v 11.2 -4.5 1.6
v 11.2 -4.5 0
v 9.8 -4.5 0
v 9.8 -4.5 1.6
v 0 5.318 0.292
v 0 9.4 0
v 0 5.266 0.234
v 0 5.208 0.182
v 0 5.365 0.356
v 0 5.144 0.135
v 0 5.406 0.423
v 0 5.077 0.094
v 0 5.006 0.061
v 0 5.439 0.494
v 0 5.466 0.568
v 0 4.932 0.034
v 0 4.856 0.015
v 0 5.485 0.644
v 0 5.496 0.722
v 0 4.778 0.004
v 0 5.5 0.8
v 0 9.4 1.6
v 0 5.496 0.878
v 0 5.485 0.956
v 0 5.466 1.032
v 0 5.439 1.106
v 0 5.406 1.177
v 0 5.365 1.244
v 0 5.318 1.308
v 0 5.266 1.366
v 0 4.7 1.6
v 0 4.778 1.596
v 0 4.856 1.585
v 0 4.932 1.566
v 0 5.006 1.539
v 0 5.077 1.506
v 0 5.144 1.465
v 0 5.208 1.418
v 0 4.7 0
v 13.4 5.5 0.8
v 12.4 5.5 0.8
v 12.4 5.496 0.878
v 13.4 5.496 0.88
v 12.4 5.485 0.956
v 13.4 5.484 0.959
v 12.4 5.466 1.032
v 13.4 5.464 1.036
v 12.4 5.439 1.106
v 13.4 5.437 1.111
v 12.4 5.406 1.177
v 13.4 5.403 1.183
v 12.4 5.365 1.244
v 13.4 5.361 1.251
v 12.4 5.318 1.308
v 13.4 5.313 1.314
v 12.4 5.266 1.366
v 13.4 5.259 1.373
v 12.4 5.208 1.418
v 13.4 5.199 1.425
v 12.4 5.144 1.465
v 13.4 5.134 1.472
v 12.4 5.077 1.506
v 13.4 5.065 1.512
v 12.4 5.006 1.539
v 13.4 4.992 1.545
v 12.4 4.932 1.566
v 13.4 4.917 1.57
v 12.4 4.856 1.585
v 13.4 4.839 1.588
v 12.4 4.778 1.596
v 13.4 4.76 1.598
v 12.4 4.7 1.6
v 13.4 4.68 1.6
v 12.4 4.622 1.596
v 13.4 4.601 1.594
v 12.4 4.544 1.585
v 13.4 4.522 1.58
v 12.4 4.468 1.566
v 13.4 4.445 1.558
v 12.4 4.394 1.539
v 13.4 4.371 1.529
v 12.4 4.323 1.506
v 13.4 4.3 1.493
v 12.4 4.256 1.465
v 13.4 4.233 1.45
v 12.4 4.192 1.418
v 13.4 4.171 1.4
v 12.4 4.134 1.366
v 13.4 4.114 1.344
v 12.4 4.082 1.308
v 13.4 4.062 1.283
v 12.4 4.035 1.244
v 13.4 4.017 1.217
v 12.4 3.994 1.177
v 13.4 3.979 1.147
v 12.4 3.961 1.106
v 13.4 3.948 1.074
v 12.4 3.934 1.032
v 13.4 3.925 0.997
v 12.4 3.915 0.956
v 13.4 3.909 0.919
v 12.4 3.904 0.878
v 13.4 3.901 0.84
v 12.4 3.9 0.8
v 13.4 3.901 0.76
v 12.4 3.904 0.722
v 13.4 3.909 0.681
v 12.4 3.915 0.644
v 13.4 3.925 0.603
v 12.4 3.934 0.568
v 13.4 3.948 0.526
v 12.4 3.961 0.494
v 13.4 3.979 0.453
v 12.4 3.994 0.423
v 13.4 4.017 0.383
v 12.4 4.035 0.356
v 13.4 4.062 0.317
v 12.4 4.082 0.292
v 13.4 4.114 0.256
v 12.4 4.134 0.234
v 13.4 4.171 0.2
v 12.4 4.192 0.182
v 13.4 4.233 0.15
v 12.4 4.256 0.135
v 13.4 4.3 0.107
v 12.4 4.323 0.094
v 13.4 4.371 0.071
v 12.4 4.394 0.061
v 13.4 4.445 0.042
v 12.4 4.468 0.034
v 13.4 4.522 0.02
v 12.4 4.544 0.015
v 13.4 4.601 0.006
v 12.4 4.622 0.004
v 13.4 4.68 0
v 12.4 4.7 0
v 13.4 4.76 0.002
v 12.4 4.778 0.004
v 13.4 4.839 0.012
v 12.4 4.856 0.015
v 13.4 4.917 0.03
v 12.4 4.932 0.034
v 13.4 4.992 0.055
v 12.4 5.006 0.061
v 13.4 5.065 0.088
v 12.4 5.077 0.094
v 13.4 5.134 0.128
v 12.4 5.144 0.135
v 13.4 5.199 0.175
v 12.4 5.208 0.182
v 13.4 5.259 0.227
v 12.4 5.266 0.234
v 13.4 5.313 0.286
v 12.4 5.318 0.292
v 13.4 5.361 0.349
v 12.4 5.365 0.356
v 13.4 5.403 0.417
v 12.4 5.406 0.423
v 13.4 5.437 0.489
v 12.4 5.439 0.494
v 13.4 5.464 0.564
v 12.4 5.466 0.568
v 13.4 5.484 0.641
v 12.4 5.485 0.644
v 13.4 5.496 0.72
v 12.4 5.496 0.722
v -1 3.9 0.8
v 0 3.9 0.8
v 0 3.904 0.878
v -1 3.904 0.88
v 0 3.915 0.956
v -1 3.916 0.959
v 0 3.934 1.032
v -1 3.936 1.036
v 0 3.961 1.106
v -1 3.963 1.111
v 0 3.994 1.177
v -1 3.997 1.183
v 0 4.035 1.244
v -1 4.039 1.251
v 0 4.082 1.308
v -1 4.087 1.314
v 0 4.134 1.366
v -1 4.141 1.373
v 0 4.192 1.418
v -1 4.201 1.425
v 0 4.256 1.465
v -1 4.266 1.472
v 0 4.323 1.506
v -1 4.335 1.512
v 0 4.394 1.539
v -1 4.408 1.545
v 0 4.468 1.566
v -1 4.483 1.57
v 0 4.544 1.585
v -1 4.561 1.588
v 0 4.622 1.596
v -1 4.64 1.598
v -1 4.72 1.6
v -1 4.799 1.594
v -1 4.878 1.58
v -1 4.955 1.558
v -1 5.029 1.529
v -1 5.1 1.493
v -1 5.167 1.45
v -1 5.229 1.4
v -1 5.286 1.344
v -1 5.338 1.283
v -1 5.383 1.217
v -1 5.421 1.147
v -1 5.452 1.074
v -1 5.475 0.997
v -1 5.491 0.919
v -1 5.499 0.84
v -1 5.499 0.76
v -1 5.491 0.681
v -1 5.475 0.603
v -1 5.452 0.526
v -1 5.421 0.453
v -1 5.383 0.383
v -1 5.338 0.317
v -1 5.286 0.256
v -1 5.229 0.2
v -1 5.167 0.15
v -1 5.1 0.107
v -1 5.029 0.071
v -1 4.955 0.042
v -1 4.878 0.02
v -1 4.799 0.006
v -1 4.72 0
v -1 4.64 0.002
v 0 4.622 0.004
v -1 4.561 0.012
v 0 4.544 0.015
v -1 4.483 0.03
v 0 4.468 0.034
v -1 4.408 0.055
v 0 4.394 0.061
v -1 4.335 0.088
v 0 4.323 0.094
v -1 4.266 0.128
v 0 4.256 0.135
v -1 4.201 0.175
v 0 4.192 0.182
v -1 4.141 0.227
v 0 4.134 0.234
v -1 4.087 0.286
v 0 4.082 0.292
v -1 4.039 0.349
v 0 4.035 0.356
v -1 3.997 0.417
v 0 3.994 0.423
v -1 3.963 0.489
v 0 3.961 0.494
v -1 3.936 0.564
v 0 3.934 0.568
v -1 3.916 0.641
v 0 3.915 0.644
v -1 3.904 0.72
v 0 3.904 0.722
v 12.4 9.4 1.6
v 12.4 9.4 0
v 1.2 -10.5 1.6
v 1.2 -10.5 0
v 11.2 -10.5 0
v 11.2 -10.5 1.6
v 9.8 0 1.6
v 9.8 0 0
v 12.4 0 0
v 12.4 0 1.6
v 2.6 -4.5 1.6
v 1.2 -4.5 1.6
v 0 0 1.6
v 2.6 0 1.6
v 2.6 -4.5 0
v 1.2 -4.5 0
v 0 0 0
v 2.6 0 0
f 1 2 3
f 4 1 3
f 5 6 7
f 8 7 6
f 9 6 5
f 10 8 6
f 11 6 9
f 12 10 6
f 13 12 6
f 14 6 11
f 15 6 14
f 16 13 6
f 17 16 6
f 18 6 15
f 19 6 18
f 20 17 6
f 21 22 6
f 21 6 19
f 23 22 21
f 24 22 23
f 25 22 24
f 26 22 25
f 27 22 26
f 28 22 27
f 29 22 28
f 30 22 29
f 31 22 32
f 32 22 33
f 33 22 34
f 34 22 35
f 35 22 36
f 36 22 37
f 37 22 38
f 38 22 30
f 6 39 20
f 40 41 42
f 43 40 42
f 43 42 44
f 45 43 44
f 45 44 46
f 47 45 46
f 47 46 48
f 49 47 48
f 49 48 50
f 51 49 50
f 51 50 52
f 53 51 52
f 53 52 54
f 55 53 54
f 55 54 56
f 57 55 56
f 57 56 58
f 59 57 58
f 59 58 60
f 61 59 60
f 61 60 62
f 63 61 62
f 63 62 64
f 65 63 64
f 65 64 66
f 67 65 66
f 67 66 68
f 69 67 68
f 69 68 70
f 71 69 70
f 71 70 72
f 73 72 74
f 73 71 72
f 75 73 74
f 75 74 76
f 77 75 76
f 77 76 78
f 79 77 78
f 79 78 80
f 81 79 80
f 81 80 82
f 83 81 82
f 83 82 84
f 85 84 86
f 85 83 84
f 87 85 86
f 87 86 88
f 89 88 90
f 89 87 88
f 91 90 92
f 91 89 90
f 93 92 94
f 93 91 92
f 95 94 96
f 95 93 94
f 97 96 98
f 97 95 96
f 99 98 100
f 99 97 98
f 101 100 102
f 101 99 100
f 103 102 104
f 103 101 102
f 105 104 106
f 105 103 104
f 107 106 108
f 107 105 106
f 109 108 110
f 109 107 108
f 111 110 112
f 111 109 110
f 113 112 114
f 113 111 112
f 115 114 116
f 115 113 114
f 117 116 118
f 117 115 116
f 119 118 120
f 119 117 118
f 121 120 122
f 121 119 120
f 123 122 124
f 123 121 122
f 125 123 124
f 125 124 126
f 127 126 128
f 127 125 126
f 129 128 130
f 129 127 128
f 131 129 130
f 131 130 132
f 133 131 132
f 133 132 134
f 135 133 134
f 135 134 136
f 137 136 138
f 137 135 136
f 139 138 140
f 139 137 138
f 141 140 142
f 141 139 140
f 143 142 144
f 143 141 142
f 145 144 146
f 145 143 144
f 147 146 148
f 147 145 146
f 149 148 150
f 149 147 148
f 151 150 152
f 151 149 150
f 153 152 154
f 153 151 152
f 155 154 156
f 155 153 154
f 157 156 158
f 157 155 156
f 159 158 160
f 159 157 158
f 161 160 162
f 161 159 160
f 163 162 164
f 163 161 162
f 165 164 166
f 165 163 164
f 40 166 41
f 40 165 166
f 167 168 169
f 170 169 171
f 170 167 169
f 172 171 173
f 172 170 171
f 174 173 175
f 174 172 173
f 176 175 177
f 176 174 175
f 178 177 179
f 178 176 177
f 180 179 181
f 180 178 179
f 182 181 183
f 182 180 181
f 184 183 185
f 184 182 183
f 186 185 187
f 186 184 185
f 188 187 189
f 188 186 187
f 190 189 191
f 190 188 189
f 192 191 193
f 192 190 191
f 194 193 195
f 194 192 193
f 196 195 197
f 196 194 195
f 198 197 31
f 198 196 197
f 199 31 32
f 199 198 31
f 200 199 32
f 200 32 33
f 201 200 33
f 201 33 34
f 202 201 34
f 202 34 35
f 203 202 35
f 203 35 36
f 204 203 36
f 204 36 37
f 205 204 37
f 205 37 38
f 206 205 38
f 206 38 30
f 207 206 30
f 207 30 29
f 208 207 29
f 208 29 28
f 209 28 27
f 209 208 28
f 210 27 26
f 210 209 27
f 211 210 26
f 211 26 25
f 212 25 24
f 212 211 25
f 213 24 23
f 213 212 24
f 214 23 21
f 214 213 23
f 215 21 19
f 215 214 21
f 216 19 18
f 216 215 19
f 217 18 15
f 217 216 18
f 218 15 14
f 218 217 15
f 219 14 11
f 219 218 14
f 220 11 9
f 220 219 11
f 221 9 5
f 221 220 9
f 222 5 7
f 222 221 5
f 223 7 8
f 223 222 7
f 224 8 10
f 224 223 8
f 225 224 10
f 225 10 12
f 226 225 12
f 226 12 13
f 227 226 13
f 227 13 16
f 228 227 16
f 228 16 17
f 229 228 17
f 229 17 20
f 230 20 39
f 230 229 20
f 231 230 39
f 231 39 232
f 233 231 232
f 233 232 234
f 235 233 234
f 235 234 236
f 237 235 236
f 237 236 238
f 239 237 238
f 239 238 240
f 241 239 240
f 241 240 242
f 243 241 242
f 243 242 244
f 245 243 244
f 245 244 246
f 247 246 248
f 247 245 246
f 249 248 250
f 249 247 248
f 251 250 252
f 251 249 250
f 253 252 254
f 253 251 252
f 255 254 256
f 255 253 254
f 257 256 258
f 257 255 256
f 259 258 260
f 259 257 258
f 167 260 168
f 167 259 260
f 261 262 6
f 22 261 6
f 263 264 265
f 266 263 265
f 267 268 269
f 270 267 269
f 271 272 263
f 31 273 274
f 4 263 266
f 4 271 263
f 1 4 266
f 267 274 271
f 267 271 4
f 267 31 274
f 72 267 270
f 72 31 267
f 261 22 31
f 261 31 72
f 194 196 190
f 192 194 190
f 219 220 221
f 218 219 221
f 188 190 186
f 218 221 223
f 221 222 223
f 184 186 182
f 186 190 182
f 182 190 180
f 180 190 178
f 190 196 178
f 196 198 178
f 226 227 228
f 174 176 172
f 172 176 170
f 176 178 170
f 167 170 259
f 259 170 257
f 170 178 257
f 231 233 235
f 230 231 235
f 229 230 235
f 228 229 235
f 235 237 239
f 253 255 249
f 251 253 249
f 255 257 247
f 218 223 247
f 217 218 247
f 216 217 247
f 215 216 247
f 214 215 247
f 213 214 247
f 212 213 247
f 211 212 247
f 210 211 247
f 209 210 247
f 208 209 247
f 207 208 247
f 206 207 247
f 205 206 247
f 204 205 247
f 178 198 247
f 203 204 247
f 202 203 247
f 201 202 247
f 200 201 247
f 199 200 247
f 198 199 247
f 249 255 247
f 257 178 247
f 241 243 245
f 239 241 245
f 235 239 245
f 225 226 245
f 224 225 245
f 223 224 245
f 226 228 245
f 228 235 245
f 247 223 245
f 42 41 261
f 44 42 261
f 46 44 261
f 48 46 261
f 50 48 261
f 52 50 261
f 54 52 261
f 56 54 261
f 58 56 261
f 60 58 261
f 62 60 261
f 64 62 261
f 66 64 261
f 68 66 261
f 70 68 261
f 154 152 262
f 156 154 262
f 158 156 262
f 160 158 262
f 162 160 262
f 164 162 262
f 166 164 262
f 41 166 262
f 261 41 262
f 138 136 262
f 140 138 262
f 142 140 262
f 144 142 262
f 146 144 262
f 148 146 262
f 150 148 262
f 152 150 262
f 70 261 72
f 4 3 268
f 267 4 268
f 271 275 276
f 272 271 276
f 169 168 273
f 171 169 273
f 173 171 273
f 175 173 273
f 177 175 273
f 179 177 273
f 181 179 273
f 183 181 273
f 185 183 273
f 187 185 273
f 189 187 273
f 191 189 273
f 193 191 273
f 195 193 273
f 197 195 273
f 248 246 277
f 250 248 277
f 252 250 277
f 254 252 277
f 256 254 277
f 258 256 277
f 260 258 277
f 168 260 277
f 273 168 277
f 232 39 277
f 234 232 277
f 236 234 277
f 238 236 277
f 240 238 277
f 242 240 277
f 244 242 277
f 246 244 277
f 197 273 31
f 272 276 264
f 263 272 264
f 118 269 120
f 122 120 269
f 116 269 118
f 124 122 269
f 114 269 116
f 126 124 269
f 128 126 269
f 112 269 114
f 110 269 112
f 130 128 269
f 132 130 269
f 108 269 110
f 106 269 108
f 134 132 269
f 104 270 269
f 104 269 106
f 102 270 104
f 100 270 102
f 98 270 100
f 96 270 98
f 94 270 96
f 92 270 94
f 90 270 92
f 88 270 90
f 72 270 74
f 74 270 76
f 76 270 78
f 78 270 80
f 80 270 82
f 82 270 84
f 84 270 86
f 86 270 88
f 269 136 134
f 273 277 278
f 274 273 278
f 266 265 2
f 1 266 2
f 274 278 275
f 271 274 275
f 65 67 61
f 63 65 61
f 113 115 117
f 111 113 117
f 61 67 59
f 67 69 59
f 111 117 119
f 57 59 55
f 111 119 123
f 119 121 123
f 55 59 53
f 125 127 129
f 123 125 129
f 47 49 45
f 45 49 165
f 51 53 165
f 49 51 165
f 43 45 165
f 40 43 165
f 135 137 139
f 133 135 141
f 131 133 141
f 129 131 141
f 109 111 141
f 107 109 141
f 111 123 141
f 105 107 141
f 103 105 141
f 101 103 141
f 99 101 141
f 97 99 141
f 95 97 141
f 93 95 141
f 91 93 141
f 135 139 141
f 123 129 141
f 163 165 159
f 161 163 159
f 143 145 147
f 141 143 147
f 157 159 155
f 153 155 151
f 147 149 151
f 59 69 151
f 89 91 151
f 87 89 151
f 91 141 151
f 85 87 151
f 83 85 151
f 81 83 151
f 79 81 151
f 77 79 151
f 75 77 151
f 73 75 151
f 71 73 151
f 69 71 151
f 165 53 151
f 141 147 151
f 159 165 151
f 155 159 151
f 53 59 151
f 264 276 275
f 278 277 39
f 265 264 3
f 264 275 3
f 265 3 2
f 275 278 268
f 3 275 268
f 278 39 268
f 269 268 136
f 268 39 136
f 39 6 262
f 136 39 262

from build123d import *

# Parameters (mm, degrees)
F1_DEPTH = 1.6
F2_W     = 3.14566
F2_H     = 3.226229
F2_R     = 0.8
F3_DEPTH = 1
F4_W     = 2.903376
F4_H     = 2.958158
F4_R     = 0.8
F5_DEPTH = 1


with BuildPart() as f1:
    # F0 (on Top) → F1 (new body)
    with BuildSketch(Plane.XY):
        Polygon((0, 3.9), (0, 0), (2.6, 0), (2.6, -4.5), (1.2, -4.5), (1.2, -10.5), (11.2, -10.5), (11.2, -4.5), (9.8, -4.5), (9.8, 0), (12.4, 0), (12.4, 3.9), (13.4, 3.9), (13.4, 5.5), (12.4, 5.5), (12.4, 9.4), (0, 9.4), (0, 5.5), (-1, 5.5), (-1, 3.9), align=None)
    extrude(amount=F1_DEPTH)

    # F2 (on face) → F3 (cut, through all)
    with BuildSketch(Plane(origin=(-1, 0, 0), x_dir=(0, -1, 0), z_dir=(-1, 0, 0))):
        with Locations((-4.643819, 0.893174)):
            Rectangle(F2_W, F2_H)
        with Locations((-4.7, 0.8)):
            Circle(F2_R, mode=Mode.SUBTRACT)
    extrude(amount=-F3_DEPTH, mode=Mode.SUBTRACT)

    # F4 (on face) → F5 (cut, through all)
    with BuildSketch(Plane.YZ.offset(13.4)):
        with Locations((4.745394, 0.737966)):
            Rectangle(F4_W, F4_H)
        with Locations((4.7, 0.8)):
            Circle(F4_R, mode=Mode.SUBTRACT)
    extrude(amount=-F5_DEPTH, mode=Mode.SUBTRACT)


solid = f1.part
